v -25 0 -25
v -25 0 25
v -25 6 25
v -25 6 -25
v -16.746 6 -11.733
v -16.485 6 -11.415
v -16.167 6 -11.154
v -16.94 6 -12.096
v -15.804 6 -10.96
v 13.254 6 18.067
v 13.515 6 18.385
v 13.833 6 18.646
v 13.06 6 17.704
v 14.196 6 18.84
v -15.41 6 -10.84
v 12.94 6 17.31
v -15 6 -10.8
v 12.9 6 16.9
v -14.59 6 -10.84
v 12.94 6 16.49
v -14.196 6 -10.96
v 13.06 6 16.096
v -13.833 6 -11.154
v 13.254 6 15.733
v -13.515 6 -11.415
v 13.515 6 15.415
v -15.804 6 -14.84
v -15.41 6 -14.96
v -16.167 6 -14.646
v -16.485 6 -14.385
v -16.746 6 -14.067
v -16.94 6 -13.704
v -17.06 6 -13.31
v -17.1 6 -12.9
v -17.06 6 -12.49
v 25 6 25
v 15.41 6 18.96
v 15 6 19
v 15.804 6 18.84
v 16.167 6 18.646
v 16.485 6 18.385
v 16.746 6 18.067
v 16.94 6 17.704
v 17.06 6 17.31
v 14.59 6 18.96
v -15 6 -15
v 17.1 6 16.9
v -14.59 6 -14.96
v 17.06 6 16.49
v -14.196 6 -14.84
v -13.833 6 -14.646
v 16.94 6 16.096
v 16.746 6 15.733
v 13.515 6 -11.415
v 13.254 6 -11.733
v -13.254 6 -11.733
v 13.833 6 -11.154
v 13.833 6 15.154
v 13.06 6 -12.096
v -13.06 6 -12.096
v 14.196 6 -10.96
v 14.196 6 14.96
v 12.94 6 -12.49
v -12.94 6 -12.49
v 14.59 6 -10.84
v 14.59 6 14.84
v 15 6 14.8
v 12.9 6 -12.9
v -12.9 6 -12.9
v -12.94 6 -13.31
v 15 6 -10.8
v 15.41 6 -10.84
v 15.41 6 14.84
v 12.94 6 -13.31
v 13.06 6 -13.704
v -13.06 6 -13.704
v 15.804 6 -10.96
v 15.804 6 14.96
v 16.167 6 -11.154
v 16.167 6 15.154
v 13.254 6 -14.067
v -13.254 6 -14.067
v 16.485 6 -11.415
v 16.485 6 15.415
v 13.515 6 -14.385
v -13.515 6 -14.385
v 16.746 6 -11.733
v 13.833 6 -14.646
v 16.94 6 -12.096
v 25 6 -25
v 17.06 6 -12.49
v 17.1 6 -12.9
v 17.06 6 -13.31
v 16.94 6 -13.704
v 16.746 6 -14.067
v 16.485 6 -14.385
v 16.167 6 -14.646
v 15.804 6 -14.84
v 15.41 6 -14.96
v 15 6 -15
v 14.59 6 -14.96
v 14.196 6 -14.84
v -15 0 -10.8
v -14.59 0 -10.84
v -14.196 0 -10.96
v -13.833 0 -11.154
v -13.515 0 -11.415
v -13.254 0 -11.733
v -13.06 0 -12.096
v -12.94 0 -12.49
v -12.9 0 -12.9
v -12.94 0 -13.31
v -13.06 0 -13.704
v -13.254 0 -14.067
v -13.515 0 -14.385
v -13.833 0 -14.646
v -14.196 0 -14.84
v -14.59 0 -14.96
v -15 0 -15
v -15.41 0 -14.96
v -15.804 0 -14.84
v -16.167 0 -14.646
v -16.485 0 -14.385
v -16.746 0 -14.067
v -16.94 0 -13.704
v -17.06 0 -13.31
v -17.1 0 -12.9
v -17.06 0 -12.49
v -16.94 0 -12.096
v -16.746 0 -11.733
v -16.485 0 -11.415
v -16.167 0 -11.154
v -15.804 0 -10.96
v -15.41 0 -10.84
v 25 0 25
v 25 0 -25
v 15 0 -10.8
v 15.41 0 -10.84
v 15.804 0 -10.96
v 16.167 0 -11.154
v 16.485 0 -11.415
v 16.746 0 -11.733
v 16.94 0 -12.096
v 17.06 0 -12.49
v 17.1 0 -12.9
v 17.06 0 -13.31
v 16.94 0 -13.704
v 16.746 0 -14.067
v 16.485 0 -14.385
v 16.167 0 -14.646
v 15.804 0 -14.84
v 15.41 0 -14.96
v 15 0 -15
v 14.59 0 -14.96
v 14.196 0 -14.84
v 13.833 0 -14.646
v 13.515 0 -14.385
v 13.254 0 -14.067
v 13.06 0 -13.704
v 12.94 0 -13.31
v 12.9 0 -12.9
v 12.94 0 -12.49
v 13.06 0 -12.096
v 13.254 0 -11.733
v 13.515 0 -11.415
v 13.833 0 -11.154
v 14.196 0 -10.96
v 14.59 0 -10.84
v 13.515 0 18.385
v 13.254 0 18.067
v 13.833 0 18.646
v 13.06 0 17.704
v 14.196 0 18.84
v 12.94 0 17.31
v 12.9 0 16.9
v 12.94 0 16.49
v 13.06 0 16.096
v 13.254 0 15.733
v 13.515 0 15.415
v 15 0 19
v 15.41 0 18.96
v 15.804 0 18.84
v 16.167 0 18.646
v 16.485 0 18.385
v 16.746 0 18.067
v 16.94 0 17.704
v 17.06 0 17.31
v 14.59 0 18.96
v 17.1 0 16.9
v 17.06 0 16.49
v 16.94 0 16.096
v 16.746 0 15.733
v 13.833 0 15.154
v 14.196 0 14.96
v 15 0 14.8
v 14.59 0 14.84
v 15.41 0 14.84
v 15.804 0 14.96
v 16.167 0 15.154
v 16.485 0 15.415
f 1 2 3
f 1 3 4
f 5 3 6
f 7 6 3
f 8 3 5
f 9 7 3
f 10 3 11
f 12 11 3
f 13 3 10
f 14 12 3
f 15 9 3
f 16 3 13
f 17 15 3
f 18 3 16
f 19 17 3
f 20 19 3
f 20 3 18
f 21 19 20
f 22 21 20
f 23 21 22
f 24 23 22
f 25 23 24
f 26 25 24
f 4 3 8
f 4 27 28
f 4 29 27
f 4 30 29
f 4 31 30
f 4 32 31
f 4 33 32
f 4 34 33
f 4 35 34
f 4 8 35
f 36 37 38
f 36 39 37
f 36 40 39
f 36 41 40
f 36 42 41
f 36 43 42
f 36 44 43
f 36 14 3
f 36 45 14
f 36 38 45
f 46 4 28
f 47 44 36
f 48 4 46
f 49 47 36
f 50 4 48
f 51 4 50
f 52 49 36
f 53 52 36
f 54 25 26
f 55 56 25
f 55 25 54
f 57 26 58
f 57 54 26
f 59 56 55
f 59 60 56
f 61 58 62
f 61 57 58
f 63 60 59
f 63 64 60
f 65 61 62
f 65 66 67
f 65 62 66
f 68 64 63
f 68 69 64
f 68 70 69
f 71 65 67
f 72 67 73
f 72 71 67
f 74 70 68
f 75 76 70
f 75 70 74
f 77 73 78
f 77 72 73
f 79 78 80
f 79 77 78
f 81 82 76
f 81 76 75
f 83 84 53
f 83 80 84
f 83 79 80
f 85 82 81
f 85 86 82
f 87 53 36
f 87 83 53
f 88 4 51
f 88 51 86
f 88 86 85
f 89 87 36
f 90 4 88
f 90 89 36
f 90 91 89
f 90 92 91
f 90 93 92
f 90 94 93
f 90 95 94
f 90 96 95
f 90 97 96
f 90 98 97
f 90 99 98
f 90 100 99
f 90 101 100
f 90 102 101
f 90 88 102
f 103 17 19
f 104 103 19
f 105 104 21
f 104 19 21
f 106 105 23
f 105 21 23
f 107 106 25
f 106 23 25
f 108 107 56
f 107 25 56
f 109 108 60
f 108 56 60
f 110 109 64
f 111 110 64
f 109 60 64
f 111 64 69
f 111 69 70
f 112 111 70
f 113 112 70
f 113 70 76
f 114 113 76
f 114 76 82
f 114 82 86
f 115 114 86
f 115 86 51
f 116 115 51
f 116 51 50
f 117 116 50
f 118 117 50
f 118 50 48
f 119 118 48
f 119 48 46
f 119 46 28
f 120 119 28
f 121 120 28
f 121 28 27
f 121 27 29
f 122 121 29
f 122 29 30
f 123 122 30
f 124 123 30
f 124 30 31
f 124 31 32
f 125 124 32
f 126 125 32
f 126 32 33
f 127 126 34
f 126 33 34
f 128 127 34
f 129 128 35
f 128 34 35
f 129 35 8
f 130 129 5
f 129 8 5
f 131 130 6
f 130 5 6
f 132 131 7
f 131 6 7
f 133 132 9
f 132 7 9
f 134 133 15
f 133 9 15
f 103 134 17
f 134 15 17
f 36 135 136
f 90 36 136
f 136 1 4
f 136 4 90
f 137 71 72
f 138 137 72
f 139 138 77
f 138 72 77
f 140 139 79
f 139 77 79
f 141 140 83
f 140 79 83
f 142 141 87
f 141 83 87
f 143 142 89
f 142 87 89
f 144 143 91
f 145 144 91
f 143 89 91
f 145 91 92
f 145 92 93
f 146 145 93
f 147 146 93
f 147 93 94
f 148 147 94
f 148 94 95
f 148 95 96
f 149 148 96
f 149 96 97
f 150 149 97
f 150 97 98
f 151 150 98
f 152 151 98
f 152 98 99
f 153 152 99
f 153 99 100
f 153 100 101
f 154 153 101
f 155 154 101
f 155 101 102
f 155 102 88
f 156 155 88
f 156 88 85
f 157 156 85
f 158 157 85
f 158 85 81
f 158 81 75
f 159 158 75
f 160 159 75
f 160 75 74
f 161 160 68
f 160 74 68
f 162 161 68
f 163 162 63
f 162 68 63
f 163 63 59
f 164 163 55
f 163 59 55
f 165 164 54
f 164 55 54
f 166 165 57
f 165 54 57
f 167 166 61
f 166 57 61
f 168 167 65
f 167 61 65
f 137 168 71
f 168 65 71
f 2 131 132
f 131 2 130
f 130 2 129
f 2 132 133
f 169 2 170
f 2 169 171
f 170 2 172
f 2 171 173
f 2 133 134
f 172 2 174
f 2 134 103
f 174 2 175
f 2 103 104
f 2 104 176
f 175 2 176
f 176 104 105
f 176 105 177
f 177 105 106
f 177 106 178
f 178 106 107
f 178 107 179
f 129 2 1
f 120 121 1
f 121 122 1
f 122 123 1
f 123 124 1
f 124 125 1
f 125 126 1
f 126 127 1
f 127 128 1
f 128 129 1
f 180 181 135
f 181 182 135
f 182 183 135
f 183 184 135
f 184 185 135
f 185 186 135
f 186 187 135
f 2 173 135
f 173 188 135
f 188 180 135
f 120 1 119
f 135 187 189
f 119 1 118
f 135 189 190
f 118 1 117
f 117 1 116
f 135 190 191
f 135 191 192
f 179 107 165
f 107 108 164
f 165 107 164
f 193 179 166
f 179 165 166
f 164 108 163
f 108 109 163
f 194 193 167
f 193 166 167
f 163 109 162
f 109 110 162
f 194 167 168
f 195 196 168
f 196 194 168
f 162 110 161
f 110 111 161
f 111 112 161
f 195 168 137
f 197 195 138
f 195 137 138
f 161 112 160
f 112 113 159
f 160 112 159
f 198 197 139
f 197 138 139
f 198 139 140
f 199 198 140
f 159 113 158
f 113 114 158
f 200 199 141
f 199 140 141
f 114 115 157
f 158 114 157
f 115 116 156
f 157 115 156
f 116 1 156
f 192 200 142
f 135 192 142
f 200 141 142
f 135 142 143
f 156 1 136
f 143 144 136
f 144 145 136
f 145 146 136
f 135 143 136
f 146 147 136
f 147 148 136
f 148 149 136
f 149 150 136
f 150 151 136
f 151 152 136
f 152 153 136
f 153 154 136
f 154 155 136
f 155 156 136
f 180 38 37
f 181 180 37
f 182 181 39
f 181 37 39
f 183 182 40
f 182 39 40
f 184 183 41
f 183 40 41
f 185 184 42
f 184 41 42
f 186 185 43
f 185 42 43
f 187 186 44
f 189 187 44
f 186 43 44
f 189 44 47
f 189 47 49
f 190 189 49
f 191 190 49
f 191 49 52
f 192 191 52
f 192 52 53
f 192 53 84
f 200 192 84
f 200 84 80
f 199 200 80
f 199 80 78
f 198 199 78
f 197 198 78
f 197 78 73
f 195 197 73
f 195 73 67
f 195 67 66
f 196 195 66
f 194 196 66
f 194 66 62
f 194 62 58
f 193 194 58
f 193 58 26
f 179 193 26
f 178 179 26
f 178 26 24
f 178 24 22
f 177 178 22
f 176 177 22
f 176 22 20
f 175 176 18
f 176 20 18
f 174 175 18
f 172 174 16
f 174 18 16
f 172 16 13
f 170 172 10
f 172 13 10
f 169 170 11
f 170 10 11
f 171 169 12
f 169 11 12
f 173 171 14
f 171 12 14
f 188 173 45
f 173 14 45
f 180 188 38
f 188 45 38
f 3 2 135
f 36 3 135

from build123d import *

# Parameters (mm, degrees)
SKETCH_1_W          = 50
SKETCH_1_H          = 50
EXTRUDE_1_DEPTH     = 6
CUT_EXTRUDE_1_REACH = 37.861
SKETCH_2_R          = 2.1
CUT_EXTRUDE_2_REACH = 37.861
SKETCH_3_R          = 2.1


with BuildPart() as part:
    # 草图1 → 凸台-拉伸1 (new body)
    with BuildSketch(Plane(origin=(0, 0, 0), x_dir=(1, 0, 0), z_dir=(0, 1, 0))):
        Rectangle(SKETCH_1_W, SKETCH_1_H)
    extrude(amount=EXTRUDE_1_DEPTH)

    # 草图2 → 切除-拉伸1 (cut, up to next)
    with BuildSketch(Plane(origin=(0, 6, 0), x_dir=(1, 0, 0), z_dir=(0, 1, 0)), mode=Mode.PRIVATE) as cut_extrude_1_sk1:
        with Locations(Location((-15, 12.9, 0), (0, 0, 270))):
            Circle(SKETCH_2_R)
    cut_extrude_1_tool1 = extrude(cut_extrude_1_sk1.sketch, amount=-CUT_EXTRUDE_1_REACH, mode=Mode.PRIVATE) & part.part
    # 草图2 → 切除-拉伸1 (cut, up to next)
    with BuildSketch(Plane(origin=(0, 6, 0), x_dir=(1, 0, 0), z_dir=(0, 1, 0)), mode=Mode.PRIVATE) as cut_extrude_1_sk2:
        with Locations(Location((15, 12.9, 0), (0, 0, 270))):
            Circle(SKETCH_2_R)
    cut_extrude_1_tool2 = extrude(cut_extrude_1_sk2.sketch, amount=-CUT_EXTRUDE_1_REACH, mode=Mode.PRIVATE) & part.part
    add(cut_extrude_1_tool1.solids().sort_by_distance((-15, 6, -12.9))[0], mode=Mode.SUBTRACT)
    add(cut_extrude_1_tool2.solids().sort_by_distance((15, 6, -12.9))[0], mode=Mode.SUBTRACT)

    # 草图3 → 切除-拉伸2 (cut, up to next)
    with BuildSketch(Plane(origin=(0, 6, 0), x_dir=(1, 0, 0), z_dir=(0, 1, 0)), mode=Mode.PRIVATE) as cut_extrude_2_sk1:
        with Locations(Location((15, -16.9, 0), (0, 0, 270))):
            Circle(SKETCH_3_R)
    cut_extrude_2_tool1 = extrude(cut_extrude_2_sk1.sketch, amount=-CUT_EXTRUDE_2_REACH, mode=Mode.PRIVATE) & part.part
    add(cut_extrude_2_tool1.solids().sort_by_distance((15, 6, 16.9))[0], mode=Mode.SUBTRACT)


solid = part.part
